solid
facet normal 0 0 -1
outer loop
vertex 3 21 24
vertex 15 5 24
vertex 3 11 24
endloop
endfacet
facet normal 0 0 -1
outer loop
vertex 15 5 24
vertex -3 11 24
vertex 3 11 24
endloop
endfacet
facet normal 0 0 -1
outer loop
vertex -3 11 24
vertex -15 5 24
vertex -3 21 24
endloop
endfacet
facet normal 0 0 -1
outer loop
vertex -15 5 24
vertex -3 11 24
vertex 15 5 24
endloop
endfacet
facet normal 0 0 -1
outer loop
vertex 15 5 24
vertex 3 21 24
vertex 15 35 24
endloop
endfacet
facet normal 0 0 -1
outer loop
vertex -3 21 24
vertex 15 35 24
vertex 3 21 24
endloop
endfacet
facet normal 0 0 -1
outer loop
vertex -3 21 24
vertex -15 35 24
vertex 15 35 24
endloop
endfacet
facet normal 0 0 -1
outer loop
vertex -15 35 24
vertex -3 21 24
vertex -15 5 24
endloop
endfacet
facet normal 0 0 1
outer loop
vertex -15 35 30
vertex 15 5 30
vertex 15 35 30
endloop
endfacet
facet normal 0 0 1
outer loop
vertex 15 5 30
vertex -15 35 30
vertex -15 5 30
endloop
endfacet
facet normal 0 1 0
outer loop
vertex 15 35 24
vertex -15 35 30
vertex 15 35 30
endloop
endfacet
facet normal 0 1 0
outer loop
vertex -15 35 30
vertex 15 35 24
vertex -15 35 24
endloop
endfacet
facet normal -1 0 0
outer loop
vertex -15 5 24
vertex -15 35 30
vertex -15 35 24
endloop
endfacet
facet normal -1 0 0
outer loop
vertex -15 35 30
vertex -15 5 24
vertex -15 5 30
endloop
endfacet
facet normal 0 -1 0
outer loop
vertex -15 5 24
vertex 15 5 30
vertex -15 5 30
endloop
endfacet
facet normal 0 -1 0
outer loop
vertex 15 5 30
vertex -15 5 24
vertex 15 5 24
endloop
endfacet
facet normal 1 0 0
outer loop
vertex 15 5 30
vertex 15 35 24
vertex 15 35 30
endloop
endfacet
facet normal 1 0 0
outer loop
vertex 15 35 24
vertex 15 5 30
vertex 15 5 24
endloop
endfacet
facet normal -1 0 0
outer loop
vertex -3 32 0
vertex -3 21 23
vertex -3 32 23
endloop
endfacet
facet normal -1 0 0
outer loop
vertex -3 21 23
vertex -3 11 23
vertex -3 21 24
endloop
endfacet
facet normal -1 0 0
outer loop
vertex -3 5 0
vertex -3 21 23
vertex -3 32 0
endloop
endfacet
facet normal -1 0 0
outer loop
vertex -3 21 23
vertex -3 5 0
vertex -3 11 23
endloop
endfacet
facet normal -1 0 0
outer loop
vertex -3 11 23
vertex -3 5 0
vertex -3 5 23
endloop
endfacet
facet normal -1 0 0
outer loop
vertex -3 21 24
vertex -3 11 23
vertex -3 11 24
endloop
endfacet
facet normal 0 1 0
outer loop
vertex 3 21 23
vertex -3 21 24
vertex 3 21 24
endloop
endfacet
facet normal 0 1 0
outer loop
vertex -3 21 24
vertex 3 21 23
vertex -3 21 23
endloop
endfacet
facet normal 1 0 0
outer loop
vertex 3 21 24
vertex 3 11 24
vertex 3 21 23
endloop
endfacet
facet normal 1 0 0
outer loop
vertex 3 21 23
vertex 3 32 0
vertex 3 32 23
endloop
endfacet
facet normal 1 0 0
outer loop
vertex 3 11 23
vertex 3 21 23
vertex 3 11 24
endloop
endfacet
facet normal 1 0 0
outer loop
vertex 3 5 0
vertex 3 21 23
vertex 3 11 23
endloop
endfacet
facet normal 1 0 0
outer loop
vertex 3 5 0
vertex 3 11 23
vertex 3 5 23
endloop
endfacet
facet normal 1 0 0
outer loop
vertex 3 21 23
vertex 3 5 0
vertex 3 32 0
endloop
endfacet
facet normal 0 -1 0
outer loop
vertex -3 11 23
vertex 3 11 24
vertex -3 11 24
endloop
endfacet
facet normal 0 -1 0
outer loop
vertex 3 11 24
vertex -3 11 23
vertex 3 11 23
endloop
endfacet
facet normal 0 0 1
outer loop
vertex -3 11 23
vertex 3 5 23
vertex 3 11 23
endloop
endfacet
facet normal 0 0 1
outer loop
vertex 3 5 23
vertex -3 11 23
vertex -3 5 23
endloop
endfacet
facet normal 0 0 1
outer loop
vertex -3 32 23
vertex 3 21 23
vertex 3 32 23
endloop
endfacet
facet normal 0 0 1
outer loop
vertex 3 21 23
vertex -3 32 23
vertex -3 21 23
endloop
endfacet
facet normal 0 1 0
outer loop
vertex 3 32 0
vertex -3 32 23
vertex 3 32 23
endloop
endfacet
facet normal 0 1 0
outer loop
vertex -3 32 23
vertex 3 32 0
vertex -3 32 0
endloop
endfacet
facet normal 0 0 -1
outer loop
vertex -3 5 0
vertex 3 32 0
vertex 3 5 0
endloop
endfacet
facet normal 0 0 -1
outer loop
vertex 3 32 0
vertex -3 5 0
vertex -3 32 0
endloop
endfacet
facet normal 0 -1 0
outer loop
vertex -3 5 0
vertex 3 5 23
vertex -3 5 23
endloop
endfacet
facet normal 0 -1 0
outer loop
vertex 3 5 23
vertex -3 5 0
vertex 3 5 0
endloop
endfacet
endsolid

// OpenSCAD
translate([0, 0, 24])
  linear_extrude(height = 6)
    difference() {
     translate([0,20]) square(30, center=true);
     translate([0, 16]) square([6, 10], center=true);
    }

color([0.7, 0.7, 1])
translate([3, 32, 0])
  rotate([90, 0, -90])
    linear_extrude(height = 6)
      polygon([
        [27, 0],
        [27, 23],
        [21, 23],
        [21, 30 -0],
        [11, 30 -0],
        [11, 23],
        [0, 23],
        [0, 0],
      ]);
